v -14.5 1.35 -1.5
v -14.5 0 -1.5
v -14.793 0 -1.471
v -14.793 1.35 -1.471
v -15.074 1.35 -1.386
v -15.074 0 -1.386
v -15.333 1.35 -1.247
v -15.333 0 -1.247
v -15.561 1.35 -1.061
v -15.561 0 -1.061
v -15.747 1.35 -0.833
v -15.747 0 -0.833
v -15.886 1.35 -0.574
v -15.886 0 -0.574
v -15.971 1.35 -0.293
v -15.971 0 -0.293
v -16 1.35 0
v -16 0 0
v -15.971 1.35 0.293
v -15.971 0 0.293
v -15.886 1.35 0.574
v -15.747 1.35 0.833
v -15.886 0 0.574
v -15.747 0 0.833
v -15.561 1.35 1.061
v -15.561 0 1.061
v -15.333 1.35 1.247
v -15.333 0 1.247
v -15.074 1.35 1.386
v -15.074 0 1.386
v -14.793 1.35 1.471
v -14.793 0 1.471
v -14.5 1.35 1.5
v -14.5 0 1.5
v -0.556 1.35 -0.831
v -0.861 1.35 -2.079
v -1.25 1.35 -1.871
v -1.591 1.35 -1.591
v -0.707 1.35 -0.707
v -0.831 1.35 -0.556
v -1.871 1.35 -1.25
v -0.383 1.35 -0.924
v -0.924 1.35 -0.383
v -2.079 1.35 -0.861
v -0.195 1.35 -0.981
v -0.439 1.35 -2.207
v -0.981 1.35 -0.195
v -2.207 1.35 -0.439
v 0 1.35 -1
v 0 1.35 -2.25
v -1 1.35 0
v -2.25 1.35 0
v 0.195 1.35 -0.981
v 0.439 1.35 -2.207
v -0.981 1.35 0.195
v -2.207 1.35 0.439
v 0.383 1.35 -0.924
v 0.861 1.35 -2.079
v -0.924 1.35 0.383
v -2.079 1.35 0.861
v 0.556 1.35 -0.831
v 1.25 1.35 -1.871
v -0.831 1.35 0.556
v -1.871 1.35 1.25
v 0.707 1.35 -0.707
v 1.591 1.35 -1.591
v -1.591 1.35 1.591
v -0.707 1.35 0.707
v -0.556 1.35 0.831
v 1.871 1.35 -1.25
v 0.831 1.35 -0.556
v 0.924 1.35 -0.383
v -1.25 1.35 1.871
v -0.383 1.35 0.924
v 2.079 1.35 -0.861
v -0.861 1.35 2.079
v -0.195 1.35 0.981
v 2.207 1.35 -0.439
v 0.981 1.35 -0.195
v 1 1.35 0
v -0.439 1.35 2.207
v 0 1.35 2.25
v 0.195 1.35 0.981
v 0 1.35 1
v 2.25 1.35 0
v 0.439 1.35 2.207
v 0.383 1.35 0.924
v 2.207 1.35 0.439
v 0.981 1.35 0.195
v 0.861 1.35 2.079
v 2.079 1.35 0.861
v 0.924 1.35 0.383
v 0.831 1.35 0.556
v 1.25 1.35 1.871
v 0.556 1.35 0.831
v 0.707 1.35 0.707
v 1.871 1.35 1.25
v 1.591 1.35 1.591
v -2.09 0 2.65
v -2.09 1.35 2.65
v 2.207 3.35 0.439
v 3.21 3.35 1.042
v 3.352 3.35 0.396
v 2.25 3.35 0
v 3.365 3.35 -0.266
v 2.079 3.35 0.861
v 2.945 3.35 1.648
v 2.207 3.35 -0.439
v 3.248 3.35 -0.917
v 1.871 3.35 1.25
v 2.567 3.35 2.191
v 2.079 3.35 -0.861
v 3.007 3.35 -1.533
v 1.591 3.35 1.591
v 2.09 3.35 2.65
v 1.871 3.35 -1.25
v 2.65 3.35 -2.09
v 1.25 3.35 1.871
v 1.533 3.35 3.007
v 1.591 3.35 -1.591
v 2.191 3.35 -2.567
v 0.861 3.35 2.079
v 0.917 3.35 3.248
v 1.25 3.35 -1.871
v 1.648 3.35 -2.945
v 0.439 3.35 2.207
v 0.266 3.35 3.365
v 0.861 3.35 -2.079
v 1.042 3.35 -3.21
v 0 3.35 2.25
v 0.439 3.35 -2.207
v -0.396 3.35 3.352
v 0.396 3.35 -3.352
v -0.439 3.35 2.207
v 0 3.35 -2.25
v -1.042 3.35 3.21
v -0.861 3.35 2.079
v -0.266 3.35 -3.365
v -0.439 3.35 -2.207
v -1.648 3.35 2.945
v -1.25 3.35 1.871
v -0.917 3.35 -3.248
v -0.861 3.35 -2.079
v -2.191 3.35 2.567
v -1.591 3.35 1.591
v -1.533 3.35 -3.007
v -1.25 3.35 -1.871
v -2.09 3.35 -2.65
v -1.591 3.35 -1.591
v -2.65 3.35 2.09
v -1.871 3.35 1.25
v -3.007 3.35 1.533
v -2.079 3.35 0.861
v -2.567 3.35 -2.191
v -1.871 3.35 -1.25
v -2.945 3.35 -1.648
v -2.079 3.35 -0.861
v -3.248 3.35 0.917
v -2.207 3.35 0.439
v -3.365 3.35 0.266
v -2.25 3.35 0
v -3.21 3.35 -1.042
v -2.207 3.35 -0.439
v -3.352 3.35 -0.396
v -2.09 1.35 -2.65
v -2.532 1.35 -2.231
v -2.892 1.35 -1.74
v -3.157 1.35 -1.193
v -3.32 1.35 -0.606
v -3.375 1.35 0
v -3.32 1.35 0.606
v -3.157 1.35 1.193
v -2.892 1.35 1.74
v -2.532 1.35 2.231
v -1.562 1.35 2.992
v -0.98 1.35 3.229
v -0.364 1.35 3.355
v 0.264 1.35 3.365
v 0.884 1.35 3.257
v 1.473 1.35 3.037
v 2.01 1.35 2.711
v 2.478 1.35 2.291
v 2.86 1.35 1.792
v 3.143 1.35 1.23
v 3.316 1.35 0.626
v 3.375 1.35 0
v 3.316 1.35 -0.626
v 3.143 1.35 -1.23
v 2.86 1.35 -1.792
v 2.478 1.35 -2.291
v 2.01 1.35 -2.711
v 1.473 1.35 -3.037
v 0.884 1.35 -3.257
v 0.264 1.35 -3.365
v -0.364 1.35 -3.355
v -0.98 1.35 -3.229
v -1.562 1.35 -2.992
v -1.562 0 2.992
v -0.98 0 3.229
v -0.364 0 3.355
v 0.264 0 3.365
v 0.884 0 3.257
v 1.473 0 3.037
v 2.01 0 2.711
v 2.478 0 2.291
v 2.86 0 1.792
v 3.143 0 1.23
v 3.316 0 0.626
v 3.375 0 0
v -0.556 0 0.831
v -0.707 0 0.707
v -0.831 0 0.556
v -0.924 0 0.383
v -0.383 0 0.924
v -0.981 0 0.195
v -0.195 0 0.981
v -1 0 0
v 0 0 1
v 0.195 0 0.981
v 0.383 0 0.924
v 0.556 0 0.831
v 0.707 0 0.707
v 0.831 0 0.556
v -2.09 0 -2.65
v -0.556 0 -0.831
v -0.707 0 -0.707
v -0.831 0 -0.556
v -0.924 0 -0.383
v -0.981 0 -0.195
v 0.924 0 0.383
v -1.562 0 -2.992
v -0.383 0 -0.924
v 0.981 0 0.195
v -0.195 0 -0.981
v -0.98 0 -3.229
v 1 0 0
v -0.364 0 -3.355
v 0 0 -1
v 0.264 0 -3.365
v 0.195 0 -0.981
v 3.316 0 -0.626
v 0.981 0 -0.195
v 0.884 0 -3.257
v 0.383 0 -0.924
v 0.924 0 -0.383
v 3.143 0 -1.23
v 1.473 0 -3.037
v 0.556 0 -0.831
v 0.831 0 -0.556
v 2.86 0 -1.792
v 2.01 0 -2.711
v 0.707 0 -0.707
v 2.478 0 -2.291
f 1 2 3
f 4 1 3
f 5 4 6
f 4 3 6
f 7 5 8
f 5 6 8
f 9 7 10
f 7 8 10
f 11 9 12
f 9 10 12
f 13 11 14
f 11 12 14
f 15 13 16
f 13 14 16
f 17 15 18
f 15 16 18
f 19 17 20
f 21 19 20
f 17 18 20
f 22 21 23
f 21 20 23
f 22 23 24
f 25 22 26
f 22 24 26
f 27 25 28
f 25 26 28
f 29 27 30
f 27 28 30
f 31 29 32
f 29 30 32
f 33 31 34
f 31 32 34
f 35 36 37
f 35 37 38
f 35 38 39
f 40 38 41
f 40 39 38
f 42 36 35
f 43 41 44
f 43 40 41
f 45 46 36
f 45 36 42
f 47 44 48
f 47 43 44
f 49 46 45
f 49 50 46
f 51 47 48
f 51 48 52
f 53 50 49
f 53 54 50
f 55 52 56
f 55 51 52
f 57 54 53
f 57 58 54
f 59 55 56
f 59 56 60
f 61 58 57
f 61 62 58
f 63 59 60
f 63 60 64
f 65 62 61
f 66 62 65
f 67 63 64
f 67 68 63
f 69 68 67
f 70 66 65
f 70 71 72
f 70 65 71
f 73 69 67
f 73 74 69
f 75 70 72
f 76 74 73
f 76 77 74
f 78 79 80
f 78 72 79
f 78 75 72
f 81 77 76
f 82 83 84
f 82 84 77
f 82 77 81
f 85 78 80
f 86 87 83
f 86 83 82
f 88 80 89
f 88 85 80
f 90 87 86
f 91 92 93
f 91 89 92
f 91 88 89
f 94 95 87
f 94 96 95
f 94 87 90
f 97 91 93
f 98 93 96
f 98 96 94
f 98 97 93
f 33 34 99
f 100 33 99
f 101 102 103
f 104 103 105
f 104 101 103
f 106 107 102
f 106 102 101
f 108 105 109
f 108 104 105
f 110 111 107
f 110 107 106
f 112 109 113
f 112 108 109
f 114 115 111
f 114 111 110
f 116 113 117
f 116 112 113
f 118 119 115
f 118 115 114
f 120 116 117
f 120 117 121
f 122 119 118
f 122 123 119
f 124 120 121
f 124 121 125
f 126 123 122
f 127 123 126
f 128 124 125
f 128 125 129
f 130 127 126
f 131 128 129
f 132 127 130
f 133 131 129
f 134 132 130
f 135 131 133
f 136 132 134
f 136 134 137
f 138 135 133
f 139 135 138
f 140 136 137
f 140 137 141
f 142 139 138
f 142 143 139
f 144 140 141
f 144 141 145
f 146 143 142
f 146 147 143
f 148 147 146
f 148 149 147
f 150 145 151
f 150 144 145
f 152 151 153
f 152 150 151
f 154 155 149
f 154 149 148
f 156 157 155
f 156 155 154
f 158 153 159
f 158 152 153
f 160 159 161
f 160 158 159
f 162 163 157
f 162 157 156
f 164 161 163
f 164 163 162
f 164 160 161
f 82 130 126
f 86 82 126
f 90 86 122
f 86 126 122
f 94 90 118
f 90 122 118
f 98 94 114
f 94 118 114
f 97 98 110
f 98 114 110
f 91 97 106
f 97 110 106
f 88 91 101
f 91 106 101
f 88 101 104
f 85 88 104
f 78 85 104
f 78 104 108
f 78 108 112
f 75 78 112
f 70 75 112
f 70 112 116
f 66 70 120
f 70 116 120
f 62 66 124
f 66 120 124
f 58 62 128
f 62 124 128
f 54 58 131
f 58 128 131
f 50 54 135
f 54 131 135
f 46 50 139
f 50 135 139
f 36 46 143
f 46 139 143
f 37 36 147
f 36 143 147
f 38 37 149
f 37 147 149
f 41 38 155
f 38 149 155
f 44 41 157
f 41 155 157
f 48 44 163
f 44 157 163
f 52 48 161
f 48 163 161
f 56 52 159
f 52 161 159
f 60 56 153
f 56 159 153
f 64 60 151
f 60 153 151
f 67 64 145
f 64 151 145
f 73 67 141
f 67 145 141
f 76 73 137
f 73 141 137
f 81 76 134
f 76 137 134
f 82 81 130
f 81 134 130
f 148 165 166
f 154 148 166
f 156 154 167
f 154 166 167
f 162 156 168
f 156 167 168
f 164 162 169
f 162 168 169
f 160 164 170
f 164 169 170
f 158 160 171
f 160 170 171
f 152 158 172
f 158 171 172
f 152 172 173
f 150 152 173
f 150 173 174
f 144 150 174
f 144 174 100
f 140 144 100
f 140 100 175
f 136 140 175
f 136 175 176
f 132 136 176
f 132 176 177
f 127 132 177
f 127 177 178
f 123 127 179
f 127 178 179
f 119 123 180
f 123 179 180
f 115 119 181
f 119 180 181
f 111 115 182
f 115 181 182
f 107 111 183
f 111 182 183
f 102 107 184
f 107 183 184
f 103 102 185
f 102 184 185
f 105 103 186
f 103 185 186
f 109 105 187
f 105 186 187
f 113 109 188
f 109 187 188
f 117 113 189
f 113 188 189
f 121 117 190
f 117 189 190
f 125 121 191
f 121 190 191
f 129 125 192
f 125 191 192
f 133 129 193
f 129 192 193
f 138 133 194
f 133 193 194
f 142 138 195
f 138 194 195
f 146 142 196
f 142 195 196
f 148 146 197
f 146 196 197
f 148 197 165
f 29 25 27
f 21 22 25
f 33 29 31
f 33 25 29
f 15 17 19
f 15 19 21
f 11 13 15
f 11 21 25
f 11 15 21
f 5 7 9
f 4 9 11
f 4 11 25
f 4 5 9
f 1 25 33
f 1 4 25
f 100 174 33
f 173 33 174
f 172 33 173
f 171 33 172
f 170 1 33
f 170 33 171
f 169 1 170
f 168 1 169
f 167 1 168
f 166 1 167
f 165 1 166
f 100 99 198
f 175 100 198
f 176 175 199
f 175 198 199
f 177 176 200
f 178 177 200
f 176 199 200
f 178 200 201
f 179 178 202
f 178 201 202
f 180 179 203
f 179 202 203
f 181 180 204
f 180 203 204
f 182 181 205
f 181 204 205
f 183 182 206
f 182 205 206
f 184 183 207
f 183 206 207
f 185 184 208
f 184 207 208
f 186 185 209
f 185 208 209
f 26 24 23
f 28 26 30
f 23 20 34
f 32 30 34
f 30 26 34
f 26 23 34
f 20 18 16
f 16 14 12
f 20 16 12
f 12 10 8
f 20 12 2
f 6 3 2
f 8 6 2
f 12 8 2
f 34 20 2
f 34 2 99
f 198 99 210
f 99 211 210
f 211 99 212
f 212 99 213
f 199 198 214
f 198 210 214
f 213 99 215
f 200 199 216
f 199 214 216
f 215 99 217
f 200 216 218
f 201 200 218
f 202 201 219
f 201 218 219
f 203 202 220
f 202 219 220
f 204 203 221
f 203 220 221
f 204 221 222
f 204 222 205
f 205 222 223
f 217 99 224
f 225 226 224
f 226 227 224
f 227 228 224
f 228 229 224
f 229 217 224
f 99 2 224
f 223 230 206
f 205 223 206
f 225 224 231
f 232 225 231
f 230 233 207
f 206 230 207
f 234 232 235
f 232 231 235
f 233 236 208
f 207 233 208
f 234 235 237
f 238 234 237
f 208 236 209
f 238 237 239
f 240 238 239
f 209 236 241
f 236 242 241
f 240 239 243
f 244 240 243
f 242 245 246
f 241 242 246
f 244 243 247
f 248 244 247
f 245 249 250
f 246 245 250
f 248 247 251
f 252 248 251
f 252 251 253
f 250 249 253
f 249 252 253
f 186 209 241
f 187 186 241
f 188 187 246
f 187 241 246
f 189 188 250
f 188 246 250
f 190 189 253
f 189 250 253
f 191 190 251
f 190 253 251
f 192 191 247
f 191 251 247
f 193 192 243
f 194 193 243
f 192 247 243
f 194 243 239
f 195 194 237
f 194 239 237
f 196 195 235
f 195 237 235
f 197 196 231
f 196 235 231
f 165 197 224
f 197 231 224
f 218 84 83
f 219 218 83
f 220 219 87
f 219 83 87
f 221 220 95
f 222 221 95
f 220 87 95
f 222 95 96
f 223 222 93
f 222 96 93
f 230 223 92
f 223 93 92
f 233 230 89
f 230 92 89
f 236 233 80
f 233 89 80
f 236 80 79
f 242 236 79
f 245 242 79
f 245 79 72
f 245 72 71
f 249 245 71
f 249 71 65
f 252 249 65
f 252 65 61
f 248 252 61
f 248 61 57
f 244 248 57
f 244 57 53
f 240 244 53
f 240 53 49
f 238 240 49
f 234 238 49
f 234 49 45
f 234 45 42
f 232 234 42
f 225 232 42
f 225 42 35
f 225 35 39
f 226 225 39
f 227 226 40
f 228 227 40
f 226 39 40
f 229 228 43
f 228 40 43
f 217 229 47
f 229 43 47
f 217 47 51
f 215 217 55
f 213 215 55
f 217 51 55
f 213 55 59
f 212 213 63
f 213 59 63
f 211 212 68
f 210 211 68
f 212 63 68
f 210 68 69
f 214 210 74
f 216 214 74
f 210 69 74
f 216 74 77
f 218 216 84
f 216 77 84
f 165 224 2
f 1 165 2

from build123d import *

# Parameters (mm, degrees)
ESTRUSIONE_ESTRUSIONE1_DEPTH = 1.35
SCHIZZO2_R                   = 3.375
ESTRUSIONE_ESTRUSIONE2_DEPTH = 2
SCHIZZO3_R                   = 2.25
TAGLIO_ESTRUSIONE1_DEPTH     = 2
SCHIZZO4_R                   = 1
TAGLIO_ESTRUSIONE2_DEPTH     = 17.47393775


with BuildPart() as part:
    # Schizzo1 → Estrusione-Estrusione1 (new body)
    with BuildSketch(Plane(origin=(0, 0, 0), x_dir=(1, 0, 0), z_dir=(0, 1, 0))):
        with BuildLine():
            ThreePointArc((-2.090005981, -2.65), (-3.375, 0), (-2.090005981, 2.65))
            Line((-2.090005981, 2.65), (-14.5, 1.5))
            ThreePointArc((-14.5, 1.5), (-16, 0), (-14.5, -1.5))
            Line((-14.5, -1.5), (-2.090005981, -2.65))
        make_face()
        with BuildLine():
            ThreePointArc((3.375, 0), (1.472558117, 3.036807138), (-2.090005981, 2.65))
            Line((-2.090005981, 2.65), (-2.090005981, -2.65))
            ThreePointArc((-2.090005981, -2.65), (1.472558117, -3.036807138), (3.375, 0))
        make_face()
        with BuildLine():
            Line((-2.090005981, -2.65), (-2.090005981, 2.65))
            ThreePointArc((-2.090005981, 2.65), (-3.375, 0), (-2.090005981, -2.65))
        make_face()
    extrude(amount=ESTRUSIONE_ESTRUSIONE1_DEPTH)

    # Schizzo2 → Estrusione-Estrusione2 (add)
    with BuildSketch(Plane(origin=(0, 1.35, 0), x_dir=(1, 0, 0), z_dir=(0, 1, 0))):
        with Locations(Location((0, 0, 0), (0, 0, 128.262191128))):
            Circle(SCHIZZO2_R)
    extrude(amount=ESTRUSIONE_ESTRUSIONE2_DEPTH)

    # Schizzo3 → Taglio-Estrusione1 (cut)
    with BuildSketch(Plane(origin=(0, 3.35, 0), x_dir=(1, 0, 0), z_dir=(0, 1, 0))):
        with Locations(Location((0, 0, 0), (0, 0, 270))):
            Circle(SCHIZZO3_R)
    extrude(amount=-TAGLIO_ESTRUSIONE1_DEPTH, mode=Mode.SUBTRACT)

    # Schizzo4 → Taglio-Estrusione2 (cut, through all)
    with BuildSketch(Plane(origin=(0, 1.35, 0), x_dir=(1, 0, 0), z_dir=(0, 1, 0))):
        with Locations(Location((0, 0, 0), (0, 0, 270))):
            Circle(SCHIZZO4_R)
    extrude(amount=-TAGLIO_ESTRUSIONE2_DEPTH, mode=Mode.SUBTRACT)


solid = part.part
